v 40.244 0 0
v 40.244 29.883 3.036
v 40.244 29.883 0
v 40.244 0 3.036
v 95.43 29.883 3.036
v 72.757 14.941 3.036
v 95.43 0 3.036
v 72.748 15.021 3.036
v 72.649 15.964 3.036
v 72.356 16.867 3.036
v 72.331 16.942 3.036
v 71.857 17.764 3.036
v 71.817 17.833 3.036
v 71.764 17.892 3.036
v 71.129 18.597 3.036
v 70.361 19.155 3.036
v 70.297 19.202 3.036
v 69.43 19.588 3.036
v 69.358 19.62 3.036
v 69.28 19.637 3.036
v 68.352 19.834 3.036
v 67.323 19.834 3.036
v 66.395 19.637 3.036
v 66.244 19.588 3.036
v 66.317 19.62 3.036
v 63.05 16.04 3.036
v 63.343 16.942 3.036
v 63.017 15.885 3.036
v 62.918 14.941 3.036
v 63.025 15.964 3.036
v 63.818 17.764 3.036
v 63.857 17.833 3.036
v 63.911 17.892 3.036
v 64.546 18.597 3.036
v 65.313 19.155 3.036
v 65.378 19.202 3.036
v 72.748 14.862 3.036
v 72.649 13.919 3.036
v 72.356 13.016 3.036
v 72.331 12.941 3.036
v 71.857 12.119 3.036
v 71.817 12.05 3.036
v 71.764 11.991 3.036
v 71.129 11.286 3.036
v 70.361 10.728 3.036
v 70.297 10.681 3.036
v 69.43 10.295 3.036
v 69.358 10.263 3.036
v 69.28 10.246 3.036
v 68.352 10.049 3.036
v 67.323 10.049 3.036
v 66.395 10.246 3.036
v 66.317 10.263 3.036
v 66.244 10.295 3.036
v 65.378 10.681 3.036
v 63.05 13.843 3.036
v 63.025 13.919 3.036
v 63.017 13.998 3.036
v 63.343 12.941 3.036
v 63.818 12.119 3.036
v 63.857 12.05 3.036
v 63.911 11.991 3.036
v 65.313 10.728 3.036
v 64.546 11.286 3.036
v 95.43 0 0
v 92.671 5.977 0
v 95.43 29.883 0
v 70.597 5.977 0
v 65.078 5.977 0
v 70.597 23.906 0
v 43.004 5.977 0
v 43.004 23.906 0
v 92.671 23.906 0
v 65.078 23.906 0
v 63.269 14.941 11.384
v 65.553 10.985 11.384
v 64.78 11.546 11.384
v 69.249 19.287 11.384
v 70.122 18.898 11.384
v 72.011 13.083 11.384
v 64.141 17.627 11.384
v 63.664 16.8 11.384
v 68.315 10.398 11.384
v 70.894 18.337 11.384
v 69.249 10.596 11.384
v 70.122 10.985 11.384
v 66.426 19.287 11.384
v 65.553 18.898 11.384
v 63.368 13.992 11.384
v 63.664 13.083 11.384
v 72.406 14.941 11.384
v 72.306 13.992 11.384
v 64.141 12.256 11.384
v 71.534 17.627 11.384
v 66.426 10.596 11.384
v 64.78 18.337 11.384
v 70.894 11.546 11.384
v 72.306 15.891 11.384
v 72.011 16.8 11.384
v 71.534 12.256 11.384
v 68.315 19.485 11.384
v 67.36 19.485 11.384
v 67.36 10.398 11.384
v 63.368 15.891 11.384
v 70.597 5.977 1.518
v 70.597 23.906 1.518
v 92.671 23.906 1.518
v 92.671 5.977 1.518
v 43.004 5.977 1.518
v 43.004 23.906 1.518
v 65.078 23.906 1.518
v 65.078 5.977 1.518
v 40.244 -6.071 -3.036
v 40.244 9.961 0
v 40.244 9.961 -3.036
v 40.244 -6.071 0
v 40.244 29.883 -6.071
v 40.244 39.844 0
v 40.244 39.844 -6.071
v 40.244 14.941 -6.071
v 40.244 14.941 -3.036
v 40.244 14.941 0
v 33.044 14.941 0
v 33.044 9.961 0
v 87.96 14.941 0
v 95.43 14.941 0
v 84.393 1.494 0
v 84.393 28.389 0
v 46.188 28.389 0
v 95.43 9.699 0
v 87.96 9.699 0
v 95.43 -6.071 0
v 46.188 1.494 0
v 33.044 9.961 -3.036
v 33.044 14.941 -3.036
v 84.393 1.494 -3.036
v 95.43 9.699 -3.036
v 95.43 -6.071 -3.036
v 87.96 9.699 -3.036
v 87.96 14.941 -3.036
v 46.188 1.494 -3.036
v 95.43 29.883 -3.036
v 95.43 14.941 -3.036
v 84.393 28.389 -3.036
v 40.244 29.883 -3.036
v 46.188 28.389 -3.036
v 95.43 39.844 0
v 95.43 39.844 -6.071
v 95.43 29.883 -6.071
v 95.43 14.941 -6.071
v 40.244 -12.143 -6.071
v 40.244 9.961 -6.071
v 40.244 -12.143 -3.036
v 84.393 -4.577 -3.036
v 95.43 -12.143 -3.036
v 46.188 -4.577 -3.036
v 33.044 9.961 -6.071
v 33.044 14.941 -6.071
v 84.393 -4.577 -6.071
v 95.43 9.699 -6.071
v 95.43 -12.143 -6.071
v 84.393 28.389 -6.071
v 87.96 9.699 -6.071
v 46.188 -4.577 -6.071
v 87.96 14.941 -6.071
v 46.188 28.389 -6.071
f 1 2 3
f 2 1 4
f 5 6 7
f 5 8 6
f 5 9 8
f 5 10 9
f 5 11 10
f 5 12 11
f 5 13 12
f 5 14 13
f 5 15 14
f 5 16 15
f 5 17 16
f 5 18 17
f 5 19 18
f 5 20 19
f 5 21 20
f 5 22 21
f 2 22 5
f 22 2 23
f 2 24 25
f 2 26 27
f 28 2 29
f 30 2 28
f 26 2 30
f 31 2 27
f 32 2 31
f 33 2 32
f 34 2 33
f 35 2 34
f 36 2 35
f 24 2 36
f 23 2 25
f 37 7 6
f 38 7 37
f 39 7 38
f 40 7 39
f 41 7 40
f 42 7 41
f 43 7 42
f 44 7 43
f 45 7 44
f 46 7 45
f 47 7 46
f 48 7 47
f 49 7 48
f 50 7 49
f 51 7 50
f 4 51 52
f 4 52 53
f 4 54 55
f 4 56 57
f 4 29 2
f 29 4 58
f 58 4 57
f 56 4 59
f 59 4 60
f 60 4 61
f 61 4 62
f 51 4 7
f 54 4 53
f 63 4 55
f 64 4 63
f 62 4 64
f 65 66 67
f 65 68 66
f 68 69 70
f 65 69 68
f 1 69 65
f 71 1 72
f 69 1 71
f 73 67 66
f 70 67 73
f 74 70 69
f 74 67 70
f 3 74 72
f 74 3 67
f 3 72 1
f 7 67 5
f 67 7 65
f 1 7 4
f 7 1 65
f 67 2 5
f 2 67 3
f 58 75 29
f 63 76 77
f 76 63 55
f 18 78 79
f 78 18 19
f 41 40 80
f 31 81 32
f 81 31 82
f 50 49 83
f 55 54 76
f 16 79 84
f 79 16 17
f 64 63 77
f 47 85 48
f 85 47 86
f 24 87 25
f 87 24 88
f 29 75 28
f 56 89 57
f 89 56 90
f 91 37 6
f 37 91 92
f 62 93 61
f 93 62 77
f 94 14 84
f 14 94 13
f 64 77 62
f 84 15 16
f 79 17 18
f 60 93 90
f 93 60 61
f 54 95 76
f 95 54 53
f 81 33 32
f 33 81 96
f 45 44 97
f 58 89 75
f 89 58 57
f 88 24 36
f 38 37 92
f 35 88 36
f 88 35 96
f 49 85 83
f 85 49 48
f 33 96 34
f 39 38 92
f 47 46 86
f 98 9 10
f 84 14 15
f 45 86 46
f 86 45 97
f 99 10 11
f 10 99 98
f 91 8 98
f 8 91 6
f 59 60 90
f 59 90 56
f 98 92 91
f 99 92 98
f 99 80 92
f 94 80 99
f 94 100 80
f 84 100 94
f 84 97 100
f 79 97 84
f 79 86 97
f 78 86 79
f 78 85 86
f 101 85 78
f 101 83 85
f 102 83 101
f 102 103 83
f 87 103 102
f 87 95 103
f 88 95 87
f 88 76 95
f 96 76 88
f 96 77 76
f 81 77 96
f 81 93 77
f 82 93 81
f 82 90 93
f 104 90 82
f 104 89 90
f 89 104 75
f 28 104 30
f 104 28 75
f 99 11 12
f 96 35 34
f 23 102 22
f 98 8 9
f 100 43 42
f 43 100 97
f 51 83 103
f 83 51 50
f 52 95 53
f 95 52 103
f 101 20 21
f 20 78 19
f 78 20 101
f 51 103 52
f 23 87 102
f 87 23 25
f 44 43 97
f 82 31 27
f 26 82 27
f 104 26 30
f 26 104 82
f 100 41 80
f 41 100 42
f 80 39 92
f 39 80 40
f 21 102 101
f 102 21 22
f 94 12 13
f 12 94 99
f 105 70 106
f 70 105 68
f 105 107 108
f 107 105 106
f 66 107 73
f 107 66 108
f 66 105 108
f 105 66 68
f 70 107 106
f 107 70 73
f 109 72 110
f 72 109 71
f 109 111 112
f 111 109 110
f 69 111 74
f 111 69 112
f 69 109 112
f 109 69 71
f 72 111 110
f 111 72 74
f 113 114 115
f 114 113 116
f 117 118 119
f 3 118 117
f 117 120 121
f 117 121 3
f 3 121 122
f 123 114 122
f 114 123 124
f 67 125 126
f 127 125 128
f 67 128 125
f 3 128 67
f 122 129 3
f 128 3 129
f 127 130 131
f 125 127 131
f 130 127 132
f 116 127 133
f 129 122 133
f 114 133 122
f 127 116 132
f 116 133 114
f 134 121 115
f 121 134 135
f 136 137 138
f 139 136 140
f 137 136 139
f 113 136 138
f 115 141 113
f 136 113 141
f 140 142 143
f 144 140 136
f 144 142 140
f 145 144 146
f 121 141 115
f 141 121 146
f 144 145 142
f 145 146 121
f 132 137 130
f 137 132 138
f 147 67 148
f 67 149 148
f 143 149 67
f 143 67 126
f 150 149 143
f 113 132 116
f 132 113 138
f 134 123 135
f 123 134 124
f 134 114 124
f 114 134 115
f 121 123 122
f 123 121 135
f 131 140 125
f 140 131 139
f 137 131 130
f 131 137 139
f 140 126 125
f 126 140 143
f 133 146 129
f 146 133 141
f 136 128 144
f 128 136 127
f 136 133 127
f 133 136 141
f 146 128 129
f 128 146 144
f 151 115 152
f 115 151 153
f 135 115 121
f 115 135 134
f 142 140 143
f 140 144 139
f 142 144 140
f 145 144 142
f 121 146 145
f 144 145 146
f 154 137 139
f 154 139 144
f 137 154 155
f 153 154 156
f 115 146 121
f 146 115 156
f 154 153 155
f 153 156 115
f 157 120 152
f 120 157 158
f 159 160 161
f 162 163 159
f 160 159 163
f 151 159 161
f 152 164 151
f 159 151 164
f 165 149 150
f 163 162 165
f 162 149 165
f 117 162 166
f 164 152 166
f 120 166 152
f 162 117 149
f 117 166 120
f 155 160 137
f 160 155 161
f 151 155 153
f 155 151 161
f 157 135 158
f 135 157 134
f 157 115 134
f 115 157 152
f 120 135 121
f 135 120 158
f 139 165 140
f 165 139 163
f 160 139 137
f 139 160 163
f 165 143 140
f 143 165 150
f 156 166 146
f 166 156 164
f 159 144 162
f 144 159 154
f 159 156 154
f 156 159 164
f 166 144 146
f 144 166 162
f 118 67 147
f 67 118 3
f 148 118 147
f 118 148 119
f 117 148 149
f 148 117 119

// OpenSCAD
coldiameter = 17;
mod = coldiameter;
ch = mod*5* 1.24;
echo("ch=",ch);
bo = mod/8; 							// base offset
btr = bo*.625;  							//base torus radius
cbdiameter = mod+(bo*2);			//diameter of column base (for inset)
//b_length = ch/1.618;					//make length a golden rectangle
n_o_c = 6;								//number of columns across front of temple
b_length = ((ch*1.618)*1.618)/(n_o_c-1); 	//comment either this or the other def out before compiiing
echo ("Length",b_length);							//if used, front of temple is golden rectangle
b_width = 2.5*((mod/2)+bo+btr);
echo("Width",b_width);
b_diff = b_length-b_width;
echo("Diff",b_length-b_width);
b_height = cbdiameter/7;
step_width = b_height * 2;
$fs = 1;


//straight_base();
//translate([0,b_width+15,0]) straight_base();
//steps(2);
//corner_base();
//rotate([0,0,90]) translate([-b_width/2.35,-b_width/3.5+5,0])
//corner_steps(2);
step_unit(2);
//corner_unit(2);

//echo((mod/2)-(bo*1.67));		//post diameter

module corner_unit(flights) {
	corner_base();
	rotate([0,0,180]) translate([-b_width-b_diff/2,-b_width-b_diff/2,0]) 
		corner_steps(flights);
}

module step_unit(flights) {
	rotate([0,0,180]) translate([-b_length*2+b_width/2,-b_width,0]) 
	 	union() { straight_base(); steps(flights);}
}

module large_corner_unit(flights) {
	rotate([0,0,180]) translate([-b_length*2+b_width/2,-b_width,0]) 
	 	union() { straight_base(); steps(flights);}
	translate([b_width,b_length-b_width/2,0]) rotate([0,0,90]) 
		union() { straight_base(); steps(flights);}
	corner_base();
	rotate([0,0,180]) translate([-b_length+b_width/2,-b_length+b_width/2,0]) 
		corner_steps(flights);
}

module corner_steps(flights) {
for ( i = [1 : flights] ) {
	translate([0,0,-b_height*i])
	difference() {
		union() {
			cube([b_length/2+b_width/2+(step_width*i),b_length/2+b_width/2+(step_width*i),b_height]);
			translate([b_width/1.074,-b_width/4.2,0]) cube([b_width/6,b_width/4.15,b_height]);  			//key
		}
		translate([0,b_width-b_width/(12*.92),0]) cube([b_width/4,b_width/(6*.94),b_height]);   //notch
		translate([b_width/3,b_width/3,0]) 
		cube([b_length/2+(step_width*(i-1)),
			b_length-b_length/2+(step_width*(i-1)),b_height+b_height/10]);   //hollow
	}
}
}

module corner_base() {
difference() {
	union() {
	cube([b_length/2+b_width/2,b_width,b_height]);			//base leg
	cube([b_width, b_length/2+b_width/2, b_height]);		//base leg
	translate([b_width/2,b_width/2,b_height*.75])
		cylinder(h=b_height*3,r1=(mod/2)-(bo*1.67),r2=(mod/2)-(bo*1.85));	//post
	}
	translate([b_width/8,b_width/8,0])
		cube([b_length/2.2,b_length/2.2,b_height/2]);				//hollow
	}
}

module steps(flights) {
for ( i = [1 : flights] ) {
	translate([0,0,-b_height*i])
	difference() {
		union() {
			cube([b_length,(step_width*i)+b_width,b_height]);							  //main block
			translate([b_length,b_width/2,0]) cube([b_width/4.15,b_width/6,b_height]);  //key
		}
		translate([0,b_width/2,0]) cube([b_width/4,b_width/(6*.95),b_height]);   //notch
		translate([b_length/5,b_width/20,0]) cube([b_length-b_length/3.25,
				b_width-b_width/10+(step_width*(i-1)),b_height+b_height/10]);	//hollow
	}
		translate([0,-b_width/3,-b_height*i])  cube([b_length,b_width/3,b_height]);	//back shelf
	}
}

module straight_base() {
difference() {
	union() {
	cube([b_length,b_width,b_height]);
	translate([b_length/2,b_width/2,b_height*.75])
		cylinder(h=b_height*3,r1=(mod/2)-(bo*1.67),r2=(mod/2)-(bo*1.85));   //fudge factor
		}
	translate([b_length/20,b_width/5,0])
		cube([b_length/2-(b_length/10),b_width-(2*b_width/5),b_height/2]);
	translate([b_length/20+b_length/2,b_width/5,0])
		cube([b_length/2-(b_length/10),b_width-(2*b_width/5),b_height/2]);}
}
